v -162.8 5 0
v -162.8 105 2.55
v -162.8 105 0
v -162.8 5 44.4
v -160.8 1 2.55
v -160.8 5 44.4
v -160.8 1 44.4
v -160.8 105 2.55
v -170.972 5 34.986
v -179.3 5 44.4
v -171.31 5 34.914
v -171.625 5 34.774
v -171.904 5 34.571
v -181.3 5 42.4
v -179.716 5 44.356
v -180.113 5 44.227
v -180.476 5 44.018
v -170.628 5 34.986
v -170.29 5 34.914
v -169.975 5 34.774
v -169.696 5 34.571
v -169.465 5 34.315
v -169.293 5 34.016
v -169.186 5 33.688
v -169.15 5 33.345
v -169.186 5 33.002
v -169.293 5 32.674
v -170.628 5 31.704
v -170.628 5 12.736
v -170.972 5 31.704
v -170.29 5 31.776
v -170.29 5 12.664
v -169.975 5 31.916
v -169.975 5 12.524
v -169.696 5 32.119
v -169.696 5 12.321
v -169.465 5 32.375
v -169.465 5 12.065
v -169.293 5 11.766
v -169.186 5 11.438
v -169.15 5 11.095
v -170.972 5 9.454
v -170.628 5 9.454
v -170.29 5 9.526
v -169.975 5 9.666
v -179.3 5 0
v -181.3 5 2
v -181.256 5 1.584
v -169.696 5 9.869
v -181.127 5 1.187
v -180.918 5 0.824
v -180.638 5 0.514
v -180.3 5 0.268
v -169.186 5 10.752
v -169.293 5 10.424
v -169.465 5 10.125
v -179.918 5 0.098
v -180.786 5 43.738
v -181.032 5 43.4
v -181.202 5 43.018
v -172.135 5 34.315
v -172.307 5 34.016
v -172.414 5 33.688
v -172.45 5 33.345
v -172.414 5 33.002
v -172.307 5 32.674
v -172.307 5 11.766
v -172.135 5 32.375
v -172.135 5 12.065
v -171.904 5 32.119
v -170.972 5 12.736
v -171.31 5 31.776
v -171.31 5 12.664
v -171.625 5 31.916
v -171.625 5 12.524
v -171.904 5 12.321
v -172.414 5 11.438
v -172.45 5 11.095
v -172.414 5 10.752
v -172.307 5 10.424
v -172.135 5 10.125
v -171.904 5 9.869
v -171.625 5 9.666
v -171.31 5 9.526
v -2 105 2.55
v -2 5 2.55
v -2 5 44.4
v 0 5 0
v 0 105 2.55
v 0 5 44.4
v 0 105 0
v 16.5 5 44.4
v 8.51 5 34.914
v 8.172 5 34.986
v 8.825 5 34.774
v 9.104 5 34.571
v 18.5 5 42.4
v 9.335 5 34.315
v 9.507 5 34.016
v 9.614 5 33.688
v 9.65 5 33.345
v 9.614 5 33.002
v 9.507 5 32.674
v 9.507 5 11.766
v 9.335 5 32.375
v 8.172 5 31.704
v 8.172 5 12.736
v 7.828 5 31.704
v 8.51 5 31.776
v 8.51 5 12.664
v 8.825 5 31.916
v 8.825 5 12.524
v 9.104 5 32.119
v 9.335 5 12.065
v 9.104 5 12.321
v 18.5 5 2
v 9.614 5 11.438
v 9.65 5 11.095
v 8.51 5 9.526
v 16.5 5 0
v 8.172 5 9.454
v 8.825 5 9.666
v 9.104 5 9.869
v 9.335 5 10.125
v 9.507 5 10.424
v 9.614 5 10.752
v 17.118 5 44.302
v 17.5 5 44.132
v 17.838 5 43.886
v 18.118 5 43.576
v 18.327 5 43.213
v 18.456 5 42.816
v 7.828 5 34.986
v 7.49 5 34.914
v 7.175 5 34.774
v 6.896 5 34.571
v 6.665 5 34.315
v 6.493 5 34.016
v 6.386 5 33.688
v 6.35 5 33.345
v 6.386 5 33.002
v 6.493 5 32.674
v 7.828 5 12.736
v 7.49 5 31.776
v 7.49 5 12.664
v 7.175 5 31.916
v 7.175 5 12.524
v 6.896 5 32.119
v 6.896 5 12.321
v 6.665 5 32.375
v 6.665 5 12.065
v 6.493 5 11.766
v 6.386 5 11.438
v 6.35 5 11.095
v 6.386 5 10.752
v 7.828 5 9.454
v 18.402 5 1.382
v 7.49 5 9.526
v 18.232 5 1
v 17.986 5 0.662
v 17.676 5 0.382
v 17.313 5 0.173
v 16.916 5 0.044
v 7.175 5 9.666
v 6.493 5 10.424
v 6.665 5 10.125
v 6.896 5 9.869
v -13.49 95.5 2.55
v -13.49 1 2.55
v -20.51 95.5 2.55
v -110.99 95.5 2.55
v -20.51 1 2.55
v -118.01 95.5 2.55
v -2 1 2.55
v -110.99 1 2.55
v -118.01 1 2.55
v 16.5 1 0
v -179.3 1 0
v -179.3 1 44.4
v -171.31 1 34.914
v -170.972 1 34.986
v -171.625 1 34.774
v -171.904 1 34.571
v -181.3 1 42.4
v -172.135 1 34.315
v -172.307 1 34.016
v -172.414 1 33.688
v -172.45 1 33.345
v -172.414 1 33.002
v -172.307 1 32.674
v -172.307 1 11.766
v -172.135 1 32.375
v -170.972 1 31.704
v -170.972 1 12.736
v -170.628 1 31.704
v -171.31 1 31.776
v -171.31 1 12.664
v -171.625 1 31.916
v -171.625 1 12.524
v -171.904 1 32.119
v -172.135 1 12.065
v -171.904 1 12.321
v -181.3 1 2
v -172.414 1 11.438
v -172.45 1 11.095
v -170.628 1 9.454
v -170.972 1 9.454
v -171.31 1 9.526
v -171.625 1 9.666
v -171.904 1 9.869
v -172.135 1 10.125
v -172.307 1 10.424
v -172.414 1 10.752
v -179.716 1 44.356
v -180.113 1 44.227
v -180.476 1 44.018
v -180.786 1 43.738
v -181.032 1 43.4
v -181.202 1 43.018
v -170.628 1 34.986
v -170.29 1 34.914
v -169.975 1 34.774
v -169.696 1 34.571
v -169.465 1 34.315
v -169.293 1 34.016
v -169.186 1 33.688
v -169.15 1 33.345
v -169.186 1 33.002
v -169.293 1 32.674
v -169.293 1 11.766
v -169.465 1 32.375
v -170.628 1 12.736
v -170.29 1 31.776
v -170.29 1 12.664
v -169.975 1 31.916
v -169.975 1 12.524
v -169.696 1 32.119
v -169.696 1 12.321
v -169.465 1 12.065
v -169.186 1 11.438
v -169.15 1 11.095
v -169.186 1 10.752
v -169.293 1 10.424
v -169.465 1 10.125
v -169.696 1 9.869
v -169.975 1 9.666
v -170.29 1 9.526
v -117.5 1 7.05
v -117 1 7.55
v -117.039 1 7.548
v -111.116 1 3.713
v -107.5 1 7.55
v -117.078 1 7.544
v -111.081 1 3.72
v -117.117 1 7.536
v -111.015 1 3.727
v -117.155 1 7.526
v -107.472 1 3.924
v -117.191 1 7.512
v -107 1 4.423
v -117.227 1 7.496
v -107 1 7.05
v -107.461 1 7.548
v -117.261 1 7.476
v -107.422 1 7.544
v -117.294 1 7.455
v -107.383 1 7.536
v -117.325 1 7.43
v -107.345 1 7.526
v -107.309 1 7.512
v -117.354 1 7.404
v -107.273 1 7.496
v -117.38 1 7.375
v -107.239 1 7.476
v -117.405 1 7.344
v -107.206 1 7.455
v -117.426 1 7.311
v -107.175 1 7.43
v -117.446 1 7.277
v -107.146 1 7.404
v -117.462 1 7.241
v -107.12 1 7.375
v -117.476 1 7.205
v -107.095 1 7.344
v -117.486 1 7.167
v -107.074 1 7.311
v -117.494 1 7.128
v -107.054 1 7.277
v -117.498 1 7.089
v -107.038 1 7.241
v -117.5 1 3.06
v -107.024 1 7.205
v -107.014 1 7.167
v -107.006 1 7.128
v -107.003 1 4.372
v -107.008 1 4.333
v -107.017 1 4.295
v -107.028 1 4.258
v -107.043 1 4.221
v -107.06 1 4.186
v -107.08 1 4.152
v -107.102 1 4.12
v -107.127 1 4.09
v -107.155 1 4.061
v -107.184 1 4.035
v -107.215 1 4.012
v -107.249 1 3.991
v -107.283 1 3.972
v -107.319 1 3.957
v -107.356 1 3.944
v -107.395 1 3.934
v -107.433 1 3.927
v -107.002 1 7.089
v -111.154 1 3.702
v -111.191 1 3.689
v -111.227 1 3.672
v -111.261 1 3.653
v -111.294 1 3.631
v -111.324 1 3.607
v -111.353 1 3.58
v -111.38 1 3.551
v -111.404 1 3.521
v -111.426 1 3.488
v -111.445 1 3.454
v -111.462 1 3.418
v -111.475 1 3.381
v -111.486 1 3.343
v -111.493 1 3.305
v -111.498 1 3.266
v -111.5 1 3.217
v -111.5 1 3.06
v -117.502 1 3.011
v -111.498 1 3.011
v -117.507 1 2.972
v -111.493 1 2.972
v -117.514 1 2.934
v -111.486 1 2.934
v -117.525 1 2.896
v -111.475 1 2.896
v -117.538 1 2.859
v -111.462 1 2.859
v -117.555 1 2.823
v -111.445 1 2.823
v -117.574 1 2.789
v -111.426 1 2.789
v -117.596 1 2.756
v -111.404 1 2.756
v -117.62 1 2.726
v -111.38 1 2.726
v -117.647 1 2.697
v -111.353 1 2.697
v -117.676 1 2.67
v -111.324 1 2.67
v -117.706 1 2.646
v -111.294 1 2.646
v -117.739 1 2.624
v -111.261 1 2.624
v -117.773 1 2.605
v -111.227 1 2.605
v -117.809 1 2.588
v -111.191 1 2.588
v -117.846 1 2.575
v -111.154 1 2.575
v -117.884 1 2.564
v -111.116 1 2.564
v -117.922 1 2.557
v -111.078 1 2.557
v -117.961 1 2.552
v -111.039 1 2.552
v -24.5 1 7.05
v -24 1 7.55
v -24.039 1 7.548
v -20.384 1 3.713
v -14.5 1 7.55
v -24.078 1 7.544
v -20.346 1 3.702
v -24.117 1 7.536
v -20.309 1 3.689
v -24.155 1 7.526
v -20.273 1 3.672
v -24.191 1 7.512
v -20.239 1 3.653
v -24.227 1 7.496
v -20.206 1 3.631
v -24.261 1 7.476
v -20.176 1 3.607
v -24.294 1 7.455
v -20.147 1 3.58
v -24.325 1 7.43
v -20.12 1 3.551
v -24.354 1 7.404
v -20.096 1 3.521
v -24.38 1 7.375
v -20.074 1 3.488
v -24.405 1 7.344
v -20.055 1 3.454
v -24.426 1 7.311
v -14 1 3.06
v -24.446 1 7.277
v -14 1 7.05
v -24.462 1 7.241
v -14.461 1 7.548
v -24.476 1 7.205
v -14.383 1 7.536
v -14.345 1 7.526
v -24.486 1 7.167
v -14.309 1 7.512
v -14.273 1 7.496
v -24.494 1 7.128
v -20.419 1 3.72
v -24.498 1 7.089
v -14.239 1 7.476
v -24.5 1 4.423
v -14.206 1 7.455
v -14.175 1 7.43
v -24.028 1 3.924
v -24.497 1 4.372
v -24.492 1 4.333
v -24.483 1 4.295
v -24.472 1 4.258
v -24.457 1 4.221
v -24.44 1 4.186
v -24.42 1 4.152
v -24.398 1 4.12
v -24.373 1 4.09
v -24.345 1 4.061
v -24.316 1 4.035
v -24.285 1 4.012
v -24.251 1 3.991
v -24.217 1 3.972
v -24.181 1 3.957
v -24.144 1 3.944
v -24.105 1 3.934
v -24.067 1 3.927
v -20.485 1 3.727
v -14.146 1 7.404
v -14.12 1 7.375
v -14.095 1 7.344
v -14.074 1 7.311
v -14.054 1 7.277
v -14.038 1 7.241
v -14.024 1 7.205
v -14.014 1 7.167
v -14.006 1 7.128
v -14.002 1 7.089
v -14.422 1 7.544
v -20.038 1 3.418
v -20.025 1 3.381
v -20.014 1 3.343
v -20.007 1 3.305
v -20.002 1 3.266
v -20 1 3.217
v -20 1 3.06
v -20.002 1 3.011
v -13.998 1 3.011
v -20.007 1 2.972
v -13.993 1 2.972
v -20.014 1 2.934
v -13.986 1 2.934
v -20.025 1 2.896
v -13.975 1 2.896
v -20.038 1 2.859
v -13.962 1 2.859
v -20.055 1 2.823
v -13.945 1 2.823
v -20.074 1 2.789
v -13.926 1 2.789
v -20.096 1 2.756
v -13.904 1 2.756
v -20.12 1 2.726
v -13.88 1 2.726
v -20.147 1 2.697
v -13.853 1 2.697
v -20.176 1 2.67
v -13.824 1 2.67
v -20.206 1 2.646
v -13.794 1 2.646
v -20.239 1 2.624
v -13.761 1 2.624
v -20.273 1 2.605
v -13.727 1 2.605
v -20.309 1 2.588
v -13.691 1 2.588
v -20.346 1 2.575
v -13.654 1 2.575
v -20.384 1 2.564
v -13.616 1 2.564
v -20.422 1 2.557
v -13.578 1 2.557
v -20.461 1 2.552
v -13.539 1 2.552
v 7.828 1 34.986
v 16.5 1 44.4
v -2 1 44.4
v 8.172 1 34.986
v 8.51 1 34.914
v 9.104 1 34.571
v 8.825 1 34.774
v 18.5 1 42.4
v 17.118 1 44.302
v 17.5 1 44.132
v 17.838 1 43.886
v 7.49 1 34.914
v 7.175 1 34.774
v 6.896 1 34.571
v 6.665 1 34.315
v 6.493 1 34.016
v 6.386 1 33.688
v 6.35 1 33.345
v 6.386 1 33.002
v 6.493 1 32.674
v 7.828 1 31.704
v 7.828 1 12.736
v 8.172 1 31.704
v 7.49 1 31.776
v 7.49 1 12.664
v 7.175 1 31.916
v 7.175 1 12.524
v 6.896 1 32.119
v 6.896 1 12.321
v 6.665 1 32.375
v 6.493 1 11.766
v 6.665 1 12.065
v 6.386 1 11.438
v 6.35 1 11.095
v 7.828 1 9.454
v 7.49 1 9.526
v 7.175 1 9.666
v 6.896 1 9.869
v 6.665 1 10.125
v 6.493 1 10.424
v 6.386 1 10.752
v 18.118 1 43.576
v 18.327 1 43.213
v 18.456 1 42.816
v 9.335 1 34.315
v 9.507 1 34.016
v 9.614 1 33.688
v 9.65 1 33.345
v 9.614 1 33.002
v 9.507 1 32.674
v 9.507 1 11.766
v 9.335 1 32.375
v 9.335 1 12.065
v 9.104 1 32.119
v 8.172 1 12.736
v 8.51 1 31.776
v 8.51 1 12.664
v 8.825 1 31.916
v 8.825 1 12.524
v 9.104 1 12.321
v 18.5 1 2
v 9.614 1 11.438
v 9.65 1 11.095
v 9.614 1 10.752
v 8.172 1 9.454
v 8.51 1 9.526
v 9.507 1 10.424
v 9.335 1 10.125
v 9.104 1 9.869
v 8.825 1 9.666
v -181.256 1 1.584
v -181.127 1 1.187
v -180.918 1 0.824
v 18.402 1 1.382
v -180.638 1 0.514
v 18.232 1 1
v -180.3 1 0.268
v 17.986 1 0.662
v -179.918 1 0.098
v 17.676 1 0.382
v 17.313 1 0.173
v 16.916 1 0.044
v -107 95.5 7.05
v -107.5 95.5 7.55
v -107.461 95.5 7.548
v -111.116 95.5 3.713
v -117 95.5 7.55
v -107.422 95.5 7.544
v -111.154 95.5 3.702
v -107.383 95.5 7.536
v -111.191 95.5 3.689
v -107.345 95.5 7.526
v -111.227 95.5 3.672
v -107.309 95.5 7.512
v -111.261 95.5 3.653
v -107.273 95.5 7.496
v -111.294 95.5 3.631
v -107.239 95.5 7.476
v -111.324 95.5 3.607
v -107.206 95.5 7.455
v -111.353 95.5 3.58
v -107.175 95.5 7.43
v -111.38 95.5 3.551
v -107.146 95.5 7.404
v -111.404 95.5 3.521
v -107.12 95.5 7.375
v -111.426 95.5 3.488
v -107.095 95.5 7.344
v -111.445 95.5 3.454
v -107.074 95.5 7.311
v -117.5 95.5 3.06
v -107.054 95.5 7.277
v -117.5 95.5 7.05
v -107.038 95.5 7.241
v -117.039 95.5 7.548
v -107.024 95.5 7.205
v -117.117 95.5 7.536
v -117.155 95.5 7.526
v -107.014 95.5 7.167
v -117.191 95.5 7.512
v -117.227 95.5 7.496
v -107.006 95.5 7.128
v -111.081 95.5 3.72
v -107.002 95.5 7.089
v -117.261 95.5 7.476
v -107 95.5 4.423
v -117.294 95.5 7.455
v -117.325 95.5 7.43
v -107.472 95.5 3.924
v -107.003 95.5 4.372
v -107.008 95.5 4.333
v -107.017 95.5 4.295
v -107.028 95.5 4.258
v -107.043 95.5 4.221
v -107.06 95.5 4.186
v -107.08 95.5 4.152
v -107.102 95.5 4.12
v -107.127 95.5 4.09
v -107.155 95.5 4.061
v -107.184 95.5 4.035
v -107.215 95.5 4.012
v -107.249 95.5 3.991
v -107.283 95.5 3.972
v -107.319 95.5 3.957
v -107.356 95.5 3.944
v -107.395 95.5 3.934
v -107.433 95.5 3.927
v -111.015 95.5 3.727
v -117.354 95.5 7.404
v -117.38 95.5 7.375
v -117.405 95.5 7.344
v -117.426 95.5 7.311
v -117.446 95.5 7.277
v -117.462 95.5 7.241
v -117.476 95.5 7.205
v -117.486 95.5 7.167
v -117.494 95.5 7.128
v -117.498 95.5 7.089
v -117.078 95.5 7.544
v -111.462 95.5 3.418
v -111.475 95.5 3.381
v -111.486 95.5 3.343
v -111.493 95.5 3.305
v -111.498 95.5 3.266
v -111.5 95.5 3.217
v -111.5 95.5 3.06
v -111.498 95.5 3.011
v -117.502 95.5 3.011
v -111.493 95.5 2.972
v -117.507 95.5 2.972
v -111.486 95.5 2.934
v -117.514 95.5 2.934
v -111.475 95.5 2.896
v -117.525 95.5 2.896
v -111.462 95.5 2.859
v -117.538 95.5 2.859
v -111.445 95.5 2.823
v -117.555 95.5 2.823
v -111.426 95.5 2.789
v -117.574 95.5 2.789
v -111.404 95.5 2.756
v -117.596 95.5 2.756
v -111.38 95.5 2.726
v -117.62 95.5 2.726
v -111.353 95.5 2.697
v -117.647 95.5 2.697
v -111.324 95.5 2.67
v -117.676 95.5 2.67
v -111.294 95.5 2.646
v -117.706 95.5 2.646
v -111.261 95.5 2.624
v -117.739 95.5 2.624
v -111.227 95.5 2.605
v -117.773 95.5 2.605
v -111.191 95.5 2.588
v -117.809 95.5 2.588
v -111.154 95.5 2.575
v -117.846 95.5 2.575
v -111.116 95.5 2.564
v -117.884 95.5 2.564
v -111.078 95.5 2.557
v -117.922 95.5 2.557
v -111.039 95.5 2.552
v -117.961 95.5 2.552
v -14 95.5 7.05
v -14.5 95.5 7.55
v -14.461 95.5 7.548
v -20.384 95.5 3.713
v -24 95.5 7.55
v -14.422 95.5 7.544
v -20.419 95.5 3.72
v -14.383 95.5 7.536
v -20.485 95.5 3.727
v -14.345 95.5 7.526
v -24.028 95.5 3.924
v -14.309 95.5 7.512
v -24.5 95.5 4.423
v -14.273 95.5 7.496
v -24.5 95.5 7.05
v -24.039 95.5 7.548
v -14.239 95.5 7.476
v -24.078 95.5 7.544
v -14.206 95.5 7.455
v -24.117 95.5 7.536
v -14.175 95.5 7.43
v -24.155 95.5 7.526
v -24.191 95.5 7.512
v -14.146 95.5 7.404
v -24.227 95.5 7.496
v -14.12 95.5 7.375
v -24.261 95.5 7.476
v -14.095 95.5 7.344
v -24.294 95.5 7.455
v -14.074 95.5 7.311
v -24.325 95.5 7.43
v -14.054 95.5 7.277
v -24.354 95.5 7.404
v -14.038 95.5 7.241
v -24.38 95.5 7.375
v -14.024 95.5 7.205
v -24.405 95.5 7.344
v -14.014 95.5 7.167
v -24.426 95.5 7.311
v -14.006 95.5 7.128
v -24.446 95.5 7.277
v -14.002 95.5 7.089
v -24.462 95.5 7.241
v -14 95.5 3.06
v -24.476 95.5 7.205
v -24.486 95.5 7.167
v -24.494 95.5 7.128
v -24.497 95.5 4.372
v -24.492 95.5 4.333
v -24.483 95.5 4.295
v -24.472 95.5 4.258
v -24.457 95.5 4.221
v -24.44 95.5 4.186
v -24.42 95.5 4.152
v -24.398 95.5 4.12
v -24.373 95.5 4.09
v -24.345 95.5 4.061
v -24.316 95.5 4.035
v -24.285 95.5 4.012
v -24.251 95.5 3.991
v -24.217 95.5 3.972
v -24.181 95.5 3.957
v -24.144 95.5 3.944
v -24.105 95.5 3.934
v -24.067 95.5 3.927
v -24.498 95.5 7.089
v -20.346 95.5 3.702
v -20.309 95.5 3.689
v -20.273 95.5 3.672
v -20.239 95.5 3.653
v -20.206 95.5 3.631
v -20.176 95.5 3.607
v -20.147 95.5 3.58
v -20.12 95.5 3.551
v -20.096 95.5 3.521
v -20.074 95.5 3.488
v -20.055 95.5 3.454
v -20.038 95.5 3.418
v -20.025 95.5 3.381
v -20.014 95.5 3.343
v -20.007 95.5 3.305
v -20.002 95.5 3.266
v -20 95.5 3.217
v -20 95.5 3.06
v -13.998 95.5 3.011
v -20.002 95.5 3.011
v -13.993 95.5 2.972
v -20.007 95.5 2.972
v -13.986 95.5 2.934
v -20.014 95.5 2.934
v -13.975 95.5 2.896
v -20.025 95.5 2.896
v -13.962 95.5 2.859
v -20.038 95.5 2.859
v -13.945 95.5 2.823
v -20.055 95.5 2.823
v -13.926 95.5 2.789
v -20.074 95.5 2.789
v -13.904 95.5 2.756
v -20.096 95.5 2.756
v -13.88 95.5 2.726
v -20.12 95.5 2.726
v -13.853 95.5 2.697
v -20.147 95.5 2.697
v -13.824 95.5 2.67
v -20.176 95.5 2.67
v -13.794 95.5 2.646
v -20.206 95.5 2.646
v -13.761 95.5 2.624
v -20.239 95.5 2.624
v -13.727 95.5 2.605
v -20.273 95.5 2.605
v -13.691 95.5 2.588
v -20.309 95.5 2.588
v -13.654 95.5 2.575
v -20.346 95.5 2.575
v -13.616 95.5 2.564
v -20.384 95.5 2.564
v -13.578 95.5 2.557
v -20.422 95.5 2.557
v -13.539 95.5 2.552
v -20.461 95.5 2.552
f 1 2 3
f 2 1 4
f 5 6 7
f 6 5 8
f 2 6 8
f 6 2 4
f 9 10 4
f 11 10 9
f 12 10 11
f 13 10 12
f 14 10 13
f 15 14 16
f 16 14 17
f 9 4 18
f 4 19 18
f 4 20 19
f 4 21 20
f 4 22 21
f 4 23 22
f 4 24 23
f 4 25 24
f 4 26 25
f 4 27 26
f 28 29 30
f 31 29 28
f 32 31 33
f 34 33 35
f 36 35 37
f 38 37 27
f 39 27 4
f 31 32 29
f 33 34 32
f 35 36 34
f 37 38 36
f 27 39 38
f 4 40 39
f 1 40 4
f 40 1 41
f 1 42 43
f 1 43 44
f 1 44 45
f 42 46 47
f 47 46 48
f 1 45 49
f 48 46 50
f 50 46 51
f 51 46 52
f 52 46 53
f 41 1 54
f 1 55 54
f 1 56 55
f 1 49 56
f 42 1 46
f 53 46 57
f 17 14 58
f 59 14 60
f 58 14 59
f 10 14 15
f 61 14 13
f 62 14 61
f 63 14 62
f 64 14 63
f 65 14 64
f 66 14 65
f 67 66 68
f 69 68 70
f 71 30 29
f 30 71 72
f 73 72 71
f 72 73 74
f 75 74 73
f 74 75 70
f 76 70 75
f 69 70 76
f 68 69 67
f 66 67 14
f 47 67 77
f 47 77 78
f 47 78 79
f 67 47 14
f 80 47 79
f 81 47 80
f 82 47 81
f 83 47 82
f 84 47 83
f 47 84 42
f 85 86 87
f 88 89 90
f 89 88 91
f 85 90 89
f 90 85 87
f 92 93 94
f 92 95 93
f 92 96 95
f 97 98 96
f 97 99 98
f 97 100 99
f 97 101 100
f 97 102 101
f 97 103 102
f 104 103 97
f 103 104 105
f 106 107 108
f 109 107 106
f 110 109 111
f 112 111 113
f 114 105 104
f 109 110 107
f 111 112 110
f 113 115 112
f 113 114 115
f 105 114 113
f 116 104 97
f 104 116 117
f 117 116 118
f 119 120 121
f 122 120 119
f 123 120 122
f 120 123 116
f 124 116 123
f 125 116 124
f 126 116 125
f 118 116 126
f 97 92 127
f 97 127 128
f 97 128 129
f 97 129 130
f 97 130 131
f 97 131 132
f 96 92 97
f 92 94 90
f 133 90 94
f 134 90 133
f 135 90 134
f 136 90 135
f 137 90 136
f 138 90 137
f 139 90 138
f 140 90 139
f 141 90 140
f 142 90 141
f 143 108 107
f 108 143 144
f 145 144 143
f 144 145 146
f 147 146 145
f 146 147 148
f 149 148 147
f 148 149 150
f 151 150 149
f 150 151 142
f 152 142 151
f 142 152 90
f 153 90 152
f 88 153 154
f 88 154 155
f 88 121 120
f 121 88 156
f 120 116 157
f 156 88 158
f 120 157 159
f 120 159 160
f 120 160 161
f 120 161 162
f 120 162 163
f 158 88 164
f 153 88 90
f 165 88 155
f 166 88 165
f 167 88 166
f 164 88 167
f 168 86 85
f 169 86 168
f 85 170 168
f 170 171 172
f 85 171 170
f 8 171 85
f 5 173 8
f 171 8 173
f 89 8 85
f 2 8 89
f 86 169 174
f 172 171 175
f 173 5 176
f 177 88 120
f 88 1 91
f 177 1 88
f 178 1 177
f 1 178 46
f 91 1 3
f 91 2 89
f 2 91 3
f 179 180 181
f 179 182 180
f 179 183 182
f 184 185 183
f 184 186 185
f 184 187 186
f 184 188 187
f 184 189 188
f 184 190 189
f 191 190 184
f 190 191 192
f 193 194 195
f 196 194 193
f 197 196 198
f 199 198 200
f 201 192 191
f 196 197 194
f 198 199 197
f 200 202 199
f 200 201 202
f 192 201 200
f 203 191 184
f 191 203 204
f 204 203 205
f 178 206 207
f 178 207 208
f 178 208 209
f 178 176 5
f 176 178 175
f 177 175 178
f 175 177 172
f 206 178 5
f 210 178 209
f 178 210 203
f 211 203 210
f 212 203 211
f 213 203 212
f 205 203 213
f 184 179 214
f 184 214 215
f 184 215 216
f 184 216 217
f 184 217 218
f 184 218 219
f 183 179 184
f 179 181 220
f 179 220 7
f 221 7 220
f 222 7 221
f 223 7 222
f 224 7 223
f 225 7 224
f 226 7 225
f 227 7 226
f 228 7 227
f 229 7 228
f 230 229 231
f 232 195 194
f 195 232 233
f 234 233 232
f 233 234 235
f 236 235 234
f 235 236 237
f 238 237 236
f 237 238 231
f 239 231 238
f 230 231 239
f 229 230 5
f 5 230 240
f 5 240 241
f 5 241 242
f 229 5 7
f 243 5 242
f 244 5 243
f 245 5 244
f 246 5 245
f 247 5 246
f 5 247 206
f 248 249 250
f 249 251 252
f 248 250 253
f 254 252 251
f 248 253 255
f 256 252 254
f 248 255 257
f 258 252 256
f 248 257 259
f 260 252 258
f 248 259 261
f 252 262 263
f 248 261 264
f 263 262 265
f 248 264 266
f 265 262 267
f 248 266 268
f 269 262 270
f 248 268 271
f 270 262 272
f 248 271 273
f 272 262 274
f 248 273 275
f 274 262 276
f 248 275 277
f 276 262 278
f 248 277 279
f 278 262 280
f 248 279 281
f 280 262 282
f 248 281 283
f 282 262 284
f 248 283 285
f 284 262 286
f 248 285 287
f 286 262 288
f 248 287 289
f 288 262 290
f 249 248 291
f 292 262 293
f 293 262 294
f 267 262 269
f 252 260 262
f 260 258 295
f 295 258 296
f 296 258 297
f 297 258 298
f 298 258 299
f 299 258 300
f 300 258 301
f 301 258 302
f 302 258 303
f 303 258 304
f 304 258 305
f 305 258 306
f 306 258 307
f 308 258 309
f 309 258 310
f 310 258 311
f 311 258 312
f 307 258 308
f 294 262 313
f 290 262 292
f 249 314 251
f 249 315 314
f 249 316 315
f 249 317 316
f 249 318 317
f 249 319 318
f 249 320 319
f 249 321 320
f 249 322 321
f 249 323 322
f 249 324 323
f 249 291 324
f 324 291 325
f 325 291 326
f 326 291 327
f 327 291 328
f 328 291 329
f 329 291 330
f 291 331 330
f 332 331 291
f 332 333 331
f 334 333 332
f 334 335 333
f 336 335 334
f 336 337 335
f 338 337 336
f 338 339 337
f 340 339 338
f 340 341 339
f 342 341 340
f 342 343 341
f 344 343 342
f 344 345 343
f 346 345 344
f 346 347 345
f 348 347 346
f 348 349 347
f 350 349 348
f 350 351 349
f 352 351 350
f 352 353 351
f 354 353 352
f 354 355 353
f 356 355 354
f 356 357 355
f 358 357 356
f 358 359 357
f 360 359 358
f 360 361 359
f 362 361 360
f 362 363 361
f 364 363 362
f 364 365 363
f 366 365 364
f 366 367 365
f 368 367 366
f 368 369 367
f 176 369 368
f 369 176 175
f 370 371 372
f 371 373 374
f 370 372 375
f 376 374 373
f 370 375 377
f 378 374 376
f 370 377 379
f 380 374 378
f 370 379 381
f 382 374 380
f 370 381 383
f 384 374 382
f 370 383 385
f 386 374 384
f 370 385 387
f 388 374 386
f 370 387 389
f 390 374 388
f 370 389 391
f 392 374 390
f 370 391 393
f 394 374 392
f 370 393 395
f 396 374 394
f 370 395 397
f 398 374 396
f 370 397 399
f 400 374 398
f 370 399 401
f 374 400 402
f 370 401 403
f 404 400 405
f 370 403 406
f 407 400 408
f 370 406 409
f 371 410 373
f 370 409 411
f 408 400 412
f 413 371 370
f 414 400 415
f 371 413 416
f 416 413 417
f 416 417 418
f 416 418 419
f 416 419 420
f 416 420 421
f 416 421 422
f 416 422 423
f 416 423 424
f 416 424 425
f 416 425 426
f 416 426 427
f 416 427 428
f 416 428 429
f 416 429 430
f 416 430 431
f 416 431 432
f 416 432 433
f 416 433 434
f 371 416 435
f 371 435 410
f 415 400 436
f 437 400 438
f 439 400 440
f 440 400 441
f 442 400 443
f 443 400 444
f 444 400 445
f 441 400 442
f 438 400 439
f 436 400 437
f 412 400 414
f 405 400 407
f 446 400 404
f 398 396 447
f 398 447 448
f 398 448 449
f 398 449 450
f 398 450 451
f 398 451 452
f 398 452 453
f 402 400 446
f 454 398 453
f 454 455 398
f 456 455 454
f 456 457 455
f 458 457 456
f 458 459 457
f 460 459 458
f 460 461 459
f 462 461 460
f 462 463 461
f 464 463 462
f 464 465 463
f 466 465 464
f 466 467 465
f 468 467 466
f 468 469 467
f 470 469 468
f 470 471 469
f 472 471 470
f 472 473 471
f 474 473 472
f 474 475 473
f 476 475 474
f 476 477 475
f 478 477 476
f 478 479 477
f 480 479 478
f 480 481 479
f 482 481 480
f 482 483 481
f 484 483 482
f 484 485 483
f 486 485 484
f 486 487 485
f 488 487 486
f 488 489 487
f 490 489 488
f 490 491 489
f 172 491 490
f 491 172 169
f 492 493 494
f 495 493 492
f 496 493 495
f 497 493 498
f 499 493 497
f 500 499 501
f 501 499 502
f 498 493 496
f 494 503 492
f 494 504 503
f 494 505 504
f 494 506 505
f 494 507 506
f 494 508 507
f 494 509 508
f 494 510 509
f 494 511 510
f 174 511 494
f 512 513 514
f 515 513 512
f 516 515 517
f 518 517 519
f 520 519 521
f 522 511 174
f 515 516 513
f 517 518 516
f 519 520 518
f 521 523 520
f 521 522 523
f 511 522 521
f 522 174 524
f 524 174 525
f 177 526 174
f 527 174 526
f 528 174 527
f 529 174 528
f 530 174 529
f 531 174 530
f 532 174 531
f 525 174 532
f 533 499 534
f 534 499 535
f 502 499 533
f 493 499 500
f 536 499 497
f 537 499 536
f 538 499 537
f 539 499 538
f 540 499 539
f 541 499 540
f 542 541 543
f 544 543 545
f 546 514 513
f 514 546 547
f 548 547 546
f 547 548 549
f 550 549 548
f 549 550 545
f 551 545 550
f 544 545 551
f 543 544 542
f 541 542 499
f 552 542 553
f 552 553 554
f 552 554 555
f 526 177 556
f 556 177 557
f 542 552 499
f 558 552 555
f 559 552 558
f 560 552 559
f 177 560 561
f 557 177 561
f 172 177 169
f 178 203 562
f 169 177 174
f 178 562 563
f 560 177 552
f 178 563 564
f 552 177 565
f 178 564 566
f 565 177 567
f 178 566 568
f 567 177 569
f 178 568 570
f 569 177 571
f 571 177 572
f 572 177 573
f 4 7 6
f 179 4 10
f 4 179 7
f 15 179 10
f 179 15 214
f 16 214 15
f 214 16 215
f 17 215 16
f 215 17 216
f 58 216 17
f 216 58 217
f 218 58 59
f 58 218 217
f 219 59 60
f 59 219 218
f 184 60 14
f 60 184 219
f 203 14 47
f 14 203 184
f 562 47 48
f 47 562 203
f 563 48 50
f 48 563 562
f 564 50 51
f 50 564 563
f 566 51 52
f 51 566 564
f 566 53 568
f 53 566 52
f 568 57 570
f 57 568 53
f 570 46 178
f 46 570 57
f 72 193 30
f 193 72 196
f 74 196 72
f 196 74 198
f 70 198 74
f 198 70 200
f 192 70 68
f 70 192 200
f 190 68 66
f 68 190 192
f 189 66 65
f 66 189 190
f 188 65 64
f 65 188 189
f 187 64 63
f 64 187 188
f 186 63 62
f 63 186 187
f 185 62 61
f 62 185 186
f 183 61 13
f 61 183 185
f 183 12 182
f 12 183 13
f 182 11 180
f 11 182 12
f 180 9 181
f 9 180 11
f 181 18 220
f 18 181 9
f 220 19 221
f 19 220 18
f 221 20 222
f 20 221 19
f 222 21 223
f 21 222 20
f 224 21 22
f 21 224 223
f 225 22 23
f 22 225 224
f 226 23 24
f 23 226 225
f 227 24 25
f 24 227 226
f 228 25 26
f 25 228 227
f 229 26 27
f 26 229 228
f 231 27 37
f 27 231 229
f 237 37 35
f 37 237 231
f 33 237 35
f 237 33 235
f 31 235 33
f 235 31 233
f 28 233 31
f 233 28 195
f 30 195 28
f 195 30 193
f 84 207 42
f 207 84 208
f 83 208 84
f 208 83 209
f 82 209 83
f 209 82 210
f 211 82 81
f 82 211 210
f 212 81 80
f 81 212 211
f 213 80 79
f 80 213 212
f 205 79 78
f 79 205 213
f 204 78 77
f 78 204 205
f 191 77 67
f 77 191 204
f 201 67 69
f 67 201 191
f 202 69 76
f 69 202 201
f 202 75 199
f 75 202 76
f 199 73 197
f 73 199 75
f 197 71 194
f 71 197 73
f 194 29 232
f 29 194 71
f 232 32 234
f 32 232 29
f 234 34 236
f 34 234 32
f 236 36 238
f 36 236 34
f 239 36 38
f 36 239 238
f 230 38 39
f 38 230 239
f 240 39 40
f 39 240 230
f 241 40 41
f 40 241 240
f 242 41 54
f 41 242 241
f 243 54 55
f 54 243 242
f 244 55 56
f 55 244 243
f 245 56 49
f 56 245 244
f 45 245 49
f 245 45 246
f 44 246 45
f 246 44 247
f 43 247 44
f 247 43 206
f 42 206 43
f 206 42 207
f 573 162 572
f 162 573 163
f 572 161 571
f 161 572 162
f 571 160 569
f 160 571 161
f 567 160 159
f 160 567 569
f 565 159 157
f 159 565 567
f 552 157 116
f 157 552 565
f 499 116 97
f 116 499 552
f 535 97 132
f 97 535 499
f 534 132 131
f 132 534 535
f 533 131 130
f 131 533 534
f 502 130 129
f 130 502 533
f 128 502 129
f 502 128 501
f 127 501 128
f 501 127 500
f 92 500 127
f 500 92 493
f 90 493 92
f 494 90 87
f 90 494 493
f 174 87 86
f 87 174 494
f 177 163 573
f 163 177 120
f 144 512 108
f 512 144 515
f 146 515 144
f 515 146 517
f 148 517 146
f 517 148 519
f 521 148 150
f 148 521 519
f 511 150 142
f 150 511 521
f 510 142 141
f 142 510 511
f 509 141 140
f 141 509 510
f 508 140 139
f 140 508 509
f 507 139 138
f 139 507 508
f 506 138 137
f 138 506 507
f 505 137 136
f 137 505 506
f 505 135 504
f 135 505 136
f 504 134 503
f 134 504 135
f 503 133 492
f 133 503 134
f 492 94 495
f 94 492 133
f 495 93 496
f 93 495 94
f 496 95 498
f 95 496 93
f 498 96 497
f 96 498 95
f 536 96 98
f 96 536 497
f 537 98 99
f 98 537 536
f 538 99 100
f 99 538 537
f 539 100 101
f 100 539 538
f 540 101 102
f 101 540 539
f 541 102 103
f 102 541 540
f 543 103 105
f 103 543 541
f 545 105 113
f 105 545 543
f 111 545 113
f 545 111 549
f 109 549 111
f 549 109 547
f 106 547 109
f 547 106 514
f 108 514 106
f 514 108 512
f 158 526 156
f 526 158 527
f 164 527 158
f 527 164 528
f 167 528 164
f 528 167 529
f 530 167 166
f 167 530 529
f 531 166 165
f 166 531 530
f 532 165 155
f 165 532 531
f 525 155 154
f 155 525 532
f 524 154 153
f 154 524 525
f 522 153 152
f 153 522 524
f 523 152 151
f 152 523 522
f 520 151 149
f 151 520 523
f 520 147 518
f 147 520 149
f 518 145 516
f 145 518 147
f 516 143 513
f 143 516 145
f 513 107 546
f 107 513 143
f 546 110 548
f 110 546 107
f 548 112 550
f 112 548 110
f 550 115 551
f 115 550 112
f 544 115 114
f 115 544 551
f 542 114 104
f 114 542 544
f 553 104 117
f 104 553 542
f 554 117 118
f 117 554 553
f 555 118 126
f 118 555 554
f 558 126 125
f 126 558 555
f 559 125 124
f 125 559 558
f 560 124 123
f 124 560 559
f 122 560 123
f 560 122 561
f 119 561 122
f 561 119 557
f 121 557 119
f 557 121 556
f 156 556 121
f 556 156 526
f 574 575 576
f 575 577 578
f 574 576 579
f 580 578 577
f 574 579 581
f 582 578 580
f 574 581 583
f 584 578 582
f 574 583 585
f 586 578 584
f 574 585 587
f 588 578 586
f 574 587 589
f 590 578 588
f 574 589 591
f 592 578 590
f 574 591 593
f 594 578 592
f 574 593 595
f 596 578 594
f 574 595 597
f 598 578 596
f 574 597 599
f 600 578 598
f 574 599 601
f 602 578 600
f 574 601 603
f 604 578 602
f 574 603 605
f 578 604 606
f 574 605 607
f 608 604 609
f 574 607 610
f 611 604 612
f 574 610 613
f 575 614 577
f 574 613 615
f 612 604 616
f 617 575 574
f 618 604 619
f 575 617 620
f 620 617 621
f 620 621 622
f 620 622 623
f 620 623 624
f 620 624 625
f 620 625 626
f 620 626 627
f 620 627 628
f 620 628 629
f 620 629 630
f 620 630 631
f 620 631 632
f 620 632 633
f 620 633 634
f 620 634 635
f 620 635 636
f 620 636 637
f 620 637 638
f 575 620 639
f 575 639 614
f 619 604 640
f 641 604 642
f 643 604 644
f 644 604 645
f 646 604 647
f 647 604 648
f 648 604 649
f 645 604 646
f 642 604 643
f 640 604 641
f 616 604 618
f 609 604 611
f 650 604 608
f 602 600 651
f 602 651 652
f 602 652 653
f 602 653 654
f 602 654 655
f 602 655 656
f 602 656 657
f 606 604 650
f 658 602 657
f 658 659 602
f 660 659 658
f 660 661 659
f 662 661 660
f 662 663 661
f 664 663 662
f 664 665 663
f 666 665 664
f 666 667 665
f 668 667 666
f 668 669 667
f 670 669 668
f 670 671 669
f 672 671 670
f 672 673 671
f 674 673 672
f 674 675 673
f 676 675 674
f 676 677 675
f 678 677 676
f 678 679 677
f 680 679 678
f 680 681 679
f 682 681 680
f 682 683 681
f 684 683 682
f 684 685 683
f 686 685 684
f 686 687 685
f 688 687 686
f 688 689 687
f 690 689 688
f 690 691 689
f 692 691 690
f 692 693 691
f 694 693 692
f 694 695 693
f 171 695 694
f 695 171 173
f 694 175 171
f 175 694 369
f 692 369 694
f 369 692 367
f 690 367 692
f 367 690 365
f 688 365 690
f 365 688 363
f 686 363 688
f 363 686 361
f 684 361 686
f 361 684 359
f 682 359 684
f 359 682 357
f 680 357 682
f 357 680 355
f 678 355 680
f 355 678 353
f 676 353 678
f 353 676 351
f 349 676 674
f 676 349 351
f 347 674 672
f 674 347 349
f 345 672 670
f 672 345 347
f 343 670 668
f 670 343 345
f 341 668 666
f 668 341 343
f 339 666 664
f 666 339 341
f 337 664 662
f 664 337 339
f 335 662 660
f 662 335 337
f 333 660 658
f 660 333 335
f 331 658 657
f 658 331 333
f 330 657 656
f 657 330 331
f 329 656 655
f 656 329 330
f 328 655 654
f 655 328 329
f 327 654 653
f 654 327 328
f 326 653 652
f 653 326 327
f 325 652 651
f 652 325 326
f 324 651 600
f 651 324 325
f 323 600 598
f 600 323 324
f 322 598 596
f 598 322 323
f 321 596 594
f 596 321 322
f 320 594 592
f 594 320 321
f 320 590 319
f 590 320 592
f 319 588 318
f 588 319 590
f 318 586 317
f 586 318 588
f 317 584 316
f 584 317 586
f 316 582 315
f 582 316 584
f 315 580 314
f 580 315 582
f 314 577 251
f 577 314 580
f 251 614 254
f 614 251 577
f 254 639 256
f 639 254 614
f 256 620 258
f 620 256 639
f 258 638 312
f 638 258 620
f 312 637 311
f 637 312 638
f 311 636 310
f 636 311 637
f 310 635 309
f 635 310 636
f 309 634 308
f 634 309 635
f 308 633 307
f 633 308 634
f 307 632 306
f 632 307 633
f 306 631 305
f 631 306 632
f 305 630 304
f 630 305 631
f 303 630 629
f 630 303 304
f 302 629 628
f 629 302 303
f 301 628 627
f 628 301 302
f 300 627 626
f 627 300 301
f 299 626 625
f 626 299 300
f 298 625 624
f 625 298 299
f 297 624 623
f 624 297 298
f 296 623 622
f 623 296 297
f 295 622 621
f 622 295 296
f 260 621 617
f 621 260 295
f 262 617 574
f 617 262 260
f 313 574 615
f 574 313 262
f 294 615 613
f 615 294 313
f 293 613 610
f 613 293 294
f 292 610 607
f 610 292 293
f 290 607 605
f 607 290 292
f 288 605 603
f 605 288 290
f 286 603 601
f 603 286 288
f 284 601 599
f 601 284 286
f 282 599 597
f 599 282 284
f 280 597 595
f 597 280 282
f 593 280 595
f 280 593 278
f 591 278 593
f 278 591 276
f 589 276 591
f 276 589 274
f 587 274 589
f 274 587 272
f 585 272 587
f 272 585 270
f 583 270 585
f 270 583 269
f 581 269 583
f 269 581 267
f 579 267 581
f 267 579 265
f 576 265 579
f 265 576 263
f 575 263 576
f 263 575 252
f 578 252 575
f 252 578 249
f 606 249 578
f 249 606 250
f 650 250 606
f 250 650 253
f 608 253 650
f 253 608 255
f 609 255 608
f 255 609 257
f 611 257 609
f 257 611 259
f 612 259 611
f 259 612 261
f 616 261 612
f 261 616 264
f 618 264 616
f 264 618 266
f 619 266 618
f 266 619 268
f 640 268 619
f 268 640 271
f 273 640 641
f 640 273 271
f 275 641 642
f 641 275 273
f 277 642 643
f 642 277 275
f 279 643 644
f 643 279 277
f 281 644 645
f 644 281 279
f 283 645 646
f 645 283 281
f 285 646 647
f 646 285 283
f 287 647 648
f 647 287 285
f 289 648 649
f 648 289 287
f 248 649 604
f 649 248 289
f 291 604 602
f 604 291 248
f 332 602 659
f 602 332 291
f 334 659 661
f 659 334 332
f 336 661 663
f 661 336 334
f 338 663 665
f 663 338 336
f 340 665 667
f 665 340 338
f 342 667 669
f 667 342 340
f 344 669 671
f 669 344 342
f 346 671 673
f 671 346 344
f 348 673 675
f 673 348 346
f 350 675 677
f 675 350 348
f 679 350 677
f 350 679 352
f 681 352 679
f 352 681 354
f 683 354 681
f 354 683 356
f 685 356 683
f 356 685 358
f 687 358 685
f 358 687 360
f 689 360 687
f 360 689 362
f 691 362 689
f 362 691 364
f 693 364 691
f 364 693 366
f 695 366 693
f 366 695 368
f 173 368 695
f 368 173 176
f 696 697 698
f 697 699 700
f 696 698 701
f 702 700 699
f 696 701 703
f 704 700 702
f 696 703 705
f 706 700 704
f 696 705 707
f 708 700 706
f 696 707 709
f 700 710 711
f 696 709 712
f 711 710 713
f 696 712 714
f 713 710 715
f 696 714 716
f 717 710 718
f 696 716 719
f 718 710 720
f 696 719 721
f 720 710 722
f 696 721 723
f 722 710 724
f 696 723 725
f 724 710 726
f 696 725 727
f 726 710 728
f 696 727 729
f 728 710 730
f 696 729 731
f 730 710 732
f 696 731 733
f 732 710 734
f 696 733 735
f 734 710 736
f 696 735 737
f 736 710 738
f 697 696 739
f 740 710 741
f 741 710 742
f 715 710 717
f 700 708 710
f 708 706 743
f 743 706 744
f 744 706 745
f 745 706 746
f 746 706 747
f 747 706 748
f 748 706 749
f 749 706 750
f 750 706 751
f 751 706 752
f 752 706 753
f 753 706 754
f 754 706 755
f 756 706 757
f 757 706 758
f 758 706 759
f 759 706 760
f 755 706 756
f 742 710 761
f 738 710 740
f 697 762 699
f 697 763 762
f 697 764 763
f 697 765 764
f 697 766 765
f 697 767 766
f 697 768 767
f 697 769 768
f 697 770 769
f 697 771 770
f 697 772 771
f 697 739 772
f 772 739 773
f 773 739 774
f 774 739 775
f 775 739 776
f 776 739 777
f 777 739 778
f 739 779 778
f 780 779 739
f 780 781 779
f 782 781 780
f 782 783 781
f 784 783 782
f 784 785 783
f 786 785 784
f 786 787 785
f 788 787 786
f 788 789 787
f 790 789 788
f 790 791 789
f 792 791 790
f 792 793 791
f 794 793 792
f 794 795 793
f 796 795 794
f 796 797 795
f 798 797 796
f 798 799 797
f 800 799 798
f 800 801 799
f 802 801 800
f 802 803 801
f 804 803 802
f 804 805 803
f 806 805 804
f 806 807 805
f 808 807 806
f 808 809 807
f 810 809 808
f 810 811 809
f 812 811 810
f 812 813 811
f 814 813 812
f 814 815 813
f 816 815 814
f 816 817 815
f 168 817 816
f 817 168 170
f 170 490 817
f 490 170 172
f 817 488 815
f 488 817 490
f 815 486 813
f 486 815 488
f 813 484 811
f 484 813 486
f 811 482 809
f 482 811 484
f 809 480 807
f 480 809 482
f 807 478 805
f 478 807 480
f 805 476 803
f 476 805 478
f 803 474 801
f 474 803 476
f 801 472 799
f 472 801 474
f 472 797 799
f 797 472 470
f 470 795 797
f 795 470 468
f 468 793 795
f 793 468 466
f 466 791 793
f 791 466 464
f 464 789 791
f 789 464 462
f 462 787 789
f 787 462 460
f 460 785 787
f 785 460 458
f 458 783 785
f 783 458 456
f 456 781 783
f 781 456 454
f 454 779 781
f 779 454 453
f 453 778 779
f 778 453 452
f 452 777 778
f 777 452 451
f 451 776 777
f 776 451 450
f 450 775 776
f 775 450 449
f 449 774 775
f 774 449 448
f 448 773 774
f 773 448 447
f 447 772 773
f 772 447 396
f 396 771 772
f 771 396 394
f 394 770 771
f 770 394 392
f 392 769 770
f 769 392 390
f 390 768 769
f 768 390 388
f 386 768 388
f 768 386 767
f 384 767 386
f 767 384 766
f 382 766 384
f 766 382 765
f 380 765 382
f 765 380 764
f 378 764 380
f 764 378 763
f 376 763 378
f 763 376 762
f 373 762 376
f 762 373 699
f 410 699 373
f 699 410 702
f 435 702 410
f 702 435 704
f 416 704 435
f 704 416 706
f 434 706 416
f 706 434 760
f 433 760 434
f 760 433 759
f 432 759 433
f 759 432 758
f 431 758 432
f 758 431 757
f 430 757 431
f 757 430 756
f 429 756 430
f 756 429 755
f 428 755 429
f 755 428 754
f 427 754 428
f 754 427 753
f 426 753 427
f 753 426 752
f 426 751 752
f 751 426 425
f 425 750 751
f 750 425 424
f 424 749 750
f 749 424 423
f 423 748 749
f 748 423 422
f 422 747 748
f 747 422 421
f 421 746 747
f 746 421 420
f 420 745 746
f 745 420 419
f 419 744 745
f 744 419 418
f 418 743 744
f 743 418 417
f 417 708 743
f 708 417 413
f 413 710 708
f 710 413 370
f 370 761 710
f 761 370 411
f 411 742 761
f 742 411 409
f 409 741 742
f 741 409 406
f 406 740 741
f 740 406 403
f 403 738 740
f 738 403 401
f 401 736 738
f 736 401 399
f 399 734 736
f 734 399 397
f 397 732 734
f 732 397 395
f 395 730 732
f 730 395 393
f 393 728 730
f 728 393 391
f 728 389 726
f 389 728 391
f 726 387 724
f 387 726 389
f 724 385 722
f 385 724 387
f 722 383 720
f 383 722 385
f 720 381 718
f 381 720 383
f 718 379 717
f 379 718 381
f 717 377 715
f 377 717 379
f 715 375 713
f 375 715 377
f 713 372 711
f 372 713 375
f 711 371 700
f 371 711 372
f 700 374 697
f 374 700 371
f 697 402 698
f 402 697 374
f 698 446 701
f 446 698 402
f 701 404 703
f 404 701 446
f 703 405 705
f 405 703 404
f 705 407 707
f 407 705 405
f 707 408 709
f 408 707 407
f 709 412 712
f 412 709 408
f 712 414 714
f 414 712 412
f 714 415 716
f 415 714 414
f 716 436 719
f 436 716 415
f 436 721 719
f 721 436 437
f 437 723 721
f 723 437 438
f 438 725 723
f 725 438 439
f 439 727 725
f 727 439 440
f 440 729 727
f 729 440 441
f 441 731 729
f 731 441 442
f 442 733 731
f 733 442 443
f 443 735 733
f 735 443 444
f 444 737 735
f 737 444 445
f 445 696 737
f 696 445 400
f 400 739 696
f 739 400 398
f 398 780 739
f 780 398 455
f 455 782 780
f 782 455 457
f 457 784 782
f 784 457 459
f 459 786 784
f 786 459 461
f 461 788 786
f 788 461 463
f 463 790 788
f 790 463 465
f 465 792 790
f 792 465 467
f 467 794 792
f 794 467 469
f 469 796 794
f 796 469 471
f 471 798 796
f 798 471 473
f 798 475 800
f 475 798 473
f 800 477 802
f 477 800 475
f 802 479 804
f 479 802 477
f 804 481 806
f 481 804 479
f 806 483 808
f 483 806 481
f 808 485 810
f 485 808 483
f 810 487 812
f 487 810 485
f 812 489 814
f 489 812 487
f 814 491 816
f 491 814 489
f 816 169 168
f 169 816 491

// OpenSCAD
// file: microlab-2.scad
/* [Hidden] */
ML2_FRAME_THICKNESS = 4;
ML2_FRAME_RADIUS = 2;
ML2_FRAME_HEIGHT = 44.4;
ML2_FRAME_HEIGHT_GAP = 0.10;
ML2_FRAME_SIDE_WIDTH_INSIDE = 18.5;
ML2_FRAME_WIDTH_INSIDE = 162.8;
ML2_FRAME_HOLE_FROM_EDGE = 10.5;
ML2_FRAME_HOLE2_FROM_BOTTOM = 33.345;
ML2_FRAME_HOLE1_FROM_BOTTOM = 11.095;
ML2_FRAME_HOLE_DIA = 3.3;

function HeightFromNumberUnits(numberUnits) =
    numberUnits * ML2_FRAME_HEIGHT + (numberUnits-1) * ML2_FRAME_HEIGHT_GAP;

//FrontPlate(1, showRear=false, openFace=true, valign="left", halign="bottom") {
//    Shelf();
//}

module FrontPlate(numberUnits = 1, showRear=false, openFace=false, valign="bottom", halign="inside-left") {
    totalWidth = ML2_FRAME_WIDTH_INSIDE + 2 * ML2_FRAME_SIDE_WIDTH_INSIDE;
    height = HeightFromNumberUnits(numberUnits);
    
    x = halign == "center" ? totalWidth/2
        : halign == "inside-left" ? ML2_FRAME_SIDE_WIDTH_INSIDE
        : halign == "inside-right" ? totalWidth - ML2_FRAME_SIDE_WIDTH_INSIDE
        : 0;

    z = valign == "top" ? height
        : valign == "middle" ? height/2
        : 0;
    
    translate([-x,0,-z]) {
        rotate([90,0,0]) {
            linear_extrude(ML2_FRAME_THICKNESS)
                difference() {
                    // Front plate
                    if (openFace) {
                        union() {
                            w = ML2_FRAME_SIDE_WIDTH_INSIDE + 2;
                            // Left
                            offset(ML2_FRAME_RADIUS, $fn=30) offset(-ML2_FRAME_RADIUS)
                                square([w, height]);
                            translate([w- ML2_FRAME_RADIUS,0,0]) square([ML2_FRAME_RADIUS, height]);
                            // Right
                            translate([totalWidth - w,0,0]) {
                            offset(ML2_FRAME_RADIUS, $fn=30) offset(-ML2_FRAME_RADIUS)
                                square([w, height]);
                            square([ML2_FRAME_RADIUS, height]);
                            }
                        }
                    } else {
                        offset(ML2_FRAME_RADIUS, $fn=30) offset(-ML2_FRAME_RADIUS)
                            square([totalWidth, height]);
                    }
                    // Fixing holes
                    for (y = [0:numberUnits-1]) translate([0,y * (ML2_FRAME_HEIGHT + ML2_FRAME_HEIGHT_GAP),0]) {
                        translate([ML2_FRAME_HOLE_FROM_EDGE, ML2_FRAME_HOLE1_FROM_BOTTOM]) circle(d=ML2_FRAME_HOLE_DIA, $fn=30);
                        translate([ML2_FRAME_HOLE_FROM_EDGE, ML2_FRAME_HOLE2_FROM_BOTTOM]) circle(d=ML2_FRAME_HOLE_DIA, $fn=30);
                        translate([totalWidth-ML2_FRAME_HOLE_FROM_EDGE, ML2_FRAME_HOLE1_FROM_BOTTOM]) circle(d=ML2_FRAME_HOLE_DIA, $fn=30);
                        translate([totalWidth-ML2_FRAME_HOLE_FROM_EDGE, ML2_FRAME_HOLE2_FROM_BOTTOM]) circle(d=ML2_FRAME_HOLE_DIA, $fn=30);
                    }
                }
        }
        if (showRear) {
            %translate([ML2_FRAME_SIDE_WIDTH_INSIDE,0,0]) cube([ML2_FRAME_WIDTH_INSIDE, 100, height]);
        }
        children();
    }
}

module Shelf(numberUnits = 1, depth=100, shelfThickness=2.55, supportThickness=2) {
    height = HeightFromNumberUnits(numberUnits);
    translate([ML2_FRAME_SIDE_WIDTH_INSIDE,0,0]) {
        translate([0,-ML2_FRAME_THICKNESS,0]) cube([ML2_FRAME_WIDTH_INSIDE, depth + ML2_FRAME_THICKNESS, shelfThickness]);
        for (x = [0, ML2_FRAME_WIDTH_INSIDE - supportThickness]) {
            translate([x,0,0])
                rotate([90,0,90]) linear_extrude(supportThickness) polygon([
                    [0, shelfThickness],
                    [0, height],
                    [depth, shelfThickness],
                ]);
        }
    }
}
// main file
include <microlab-2.scad>

SupportThickness = 2;
ShelfThickness = 2.55;

FLANGE_THICKNESS = 1.15;
FLANGE_DEPTH = 9;
FLANGE_LENGTH = 94.5;
FLANGE_TOTAL_WIDTH = 89;
OFFSET = 19;

$fn = 80;

// Shift all back so we can see the axis
translate([0,5,0]) {
    FrontPlate(1, showRear=false, openFace=true, halign="inside-right") {
        Shelf(shelfThickness=ShelfThickness, supportThickness=SupportThickness);
    }

    %translate([-FLANGE_TOTAL_WIDTH -SupportThickness -OFFSET , -6, ShelfThickness]) cube([FLANGE_TOTAL_WIDTH, FLANGE_LENGTH, FLANGE_THICKNESS]);


    /*
                    ┌──────────────────────────────┐            
                    │                              │            
                    │                              │            
                    │                              │            
             q      │                              │            
        1─────────2 │                              │ ──────────│
       h│     4─f─3 │                              │ │───      │
        0─────5  ───────────────────────────────────── │──────│
           a

    Edit/view: https://cascii.app/93fb7
    */
    a = 6;
    h = 5;
    f = FLANGE_DEPTH/2;
    q = a + f;
    w = FLANGE_TOTAL_WIDTH + 2*f;

    points = [
        [-5,0],
        // 0    1       2       3                           4                       5
        [0,0], [0,h], [q,h], [q,FLANGE_THICKNESS + 0.25], [q-f, FLANGE_THICKNESS], [q-f, -0],
        [q-f+5,0], [q-f+5,-1], [-5,-1]
    ];

    // Left
    translate([-w -OFFSET -SupportThickness +1.5, FLANGE_LENGTH, ShelfThickness]) rotate([90,0,0])
          translate([0,0,4])
              linear_extrude(FLANGE_LENGTH) offset(0.5) offset(-1) offset(0.5) polygon(points);

    // Right
    translate([-OFFSET -SupportThickness +a + 1 , 0, ShelfThickness]) rotate([90,0,180])
          translate([0,0,-4]) linear_extrude(FLANGE_LENGTH) offset(0.5) offset(-1) offset(0.5) polygon(points);
          
//    // Stop
//    #translate([-w -OFFSET -SupportThickness , -4 +FLANGE_LENGTH , ShelfThickness]) cube([w, 4, FLANGE_THICKNESS + 1]);
}
